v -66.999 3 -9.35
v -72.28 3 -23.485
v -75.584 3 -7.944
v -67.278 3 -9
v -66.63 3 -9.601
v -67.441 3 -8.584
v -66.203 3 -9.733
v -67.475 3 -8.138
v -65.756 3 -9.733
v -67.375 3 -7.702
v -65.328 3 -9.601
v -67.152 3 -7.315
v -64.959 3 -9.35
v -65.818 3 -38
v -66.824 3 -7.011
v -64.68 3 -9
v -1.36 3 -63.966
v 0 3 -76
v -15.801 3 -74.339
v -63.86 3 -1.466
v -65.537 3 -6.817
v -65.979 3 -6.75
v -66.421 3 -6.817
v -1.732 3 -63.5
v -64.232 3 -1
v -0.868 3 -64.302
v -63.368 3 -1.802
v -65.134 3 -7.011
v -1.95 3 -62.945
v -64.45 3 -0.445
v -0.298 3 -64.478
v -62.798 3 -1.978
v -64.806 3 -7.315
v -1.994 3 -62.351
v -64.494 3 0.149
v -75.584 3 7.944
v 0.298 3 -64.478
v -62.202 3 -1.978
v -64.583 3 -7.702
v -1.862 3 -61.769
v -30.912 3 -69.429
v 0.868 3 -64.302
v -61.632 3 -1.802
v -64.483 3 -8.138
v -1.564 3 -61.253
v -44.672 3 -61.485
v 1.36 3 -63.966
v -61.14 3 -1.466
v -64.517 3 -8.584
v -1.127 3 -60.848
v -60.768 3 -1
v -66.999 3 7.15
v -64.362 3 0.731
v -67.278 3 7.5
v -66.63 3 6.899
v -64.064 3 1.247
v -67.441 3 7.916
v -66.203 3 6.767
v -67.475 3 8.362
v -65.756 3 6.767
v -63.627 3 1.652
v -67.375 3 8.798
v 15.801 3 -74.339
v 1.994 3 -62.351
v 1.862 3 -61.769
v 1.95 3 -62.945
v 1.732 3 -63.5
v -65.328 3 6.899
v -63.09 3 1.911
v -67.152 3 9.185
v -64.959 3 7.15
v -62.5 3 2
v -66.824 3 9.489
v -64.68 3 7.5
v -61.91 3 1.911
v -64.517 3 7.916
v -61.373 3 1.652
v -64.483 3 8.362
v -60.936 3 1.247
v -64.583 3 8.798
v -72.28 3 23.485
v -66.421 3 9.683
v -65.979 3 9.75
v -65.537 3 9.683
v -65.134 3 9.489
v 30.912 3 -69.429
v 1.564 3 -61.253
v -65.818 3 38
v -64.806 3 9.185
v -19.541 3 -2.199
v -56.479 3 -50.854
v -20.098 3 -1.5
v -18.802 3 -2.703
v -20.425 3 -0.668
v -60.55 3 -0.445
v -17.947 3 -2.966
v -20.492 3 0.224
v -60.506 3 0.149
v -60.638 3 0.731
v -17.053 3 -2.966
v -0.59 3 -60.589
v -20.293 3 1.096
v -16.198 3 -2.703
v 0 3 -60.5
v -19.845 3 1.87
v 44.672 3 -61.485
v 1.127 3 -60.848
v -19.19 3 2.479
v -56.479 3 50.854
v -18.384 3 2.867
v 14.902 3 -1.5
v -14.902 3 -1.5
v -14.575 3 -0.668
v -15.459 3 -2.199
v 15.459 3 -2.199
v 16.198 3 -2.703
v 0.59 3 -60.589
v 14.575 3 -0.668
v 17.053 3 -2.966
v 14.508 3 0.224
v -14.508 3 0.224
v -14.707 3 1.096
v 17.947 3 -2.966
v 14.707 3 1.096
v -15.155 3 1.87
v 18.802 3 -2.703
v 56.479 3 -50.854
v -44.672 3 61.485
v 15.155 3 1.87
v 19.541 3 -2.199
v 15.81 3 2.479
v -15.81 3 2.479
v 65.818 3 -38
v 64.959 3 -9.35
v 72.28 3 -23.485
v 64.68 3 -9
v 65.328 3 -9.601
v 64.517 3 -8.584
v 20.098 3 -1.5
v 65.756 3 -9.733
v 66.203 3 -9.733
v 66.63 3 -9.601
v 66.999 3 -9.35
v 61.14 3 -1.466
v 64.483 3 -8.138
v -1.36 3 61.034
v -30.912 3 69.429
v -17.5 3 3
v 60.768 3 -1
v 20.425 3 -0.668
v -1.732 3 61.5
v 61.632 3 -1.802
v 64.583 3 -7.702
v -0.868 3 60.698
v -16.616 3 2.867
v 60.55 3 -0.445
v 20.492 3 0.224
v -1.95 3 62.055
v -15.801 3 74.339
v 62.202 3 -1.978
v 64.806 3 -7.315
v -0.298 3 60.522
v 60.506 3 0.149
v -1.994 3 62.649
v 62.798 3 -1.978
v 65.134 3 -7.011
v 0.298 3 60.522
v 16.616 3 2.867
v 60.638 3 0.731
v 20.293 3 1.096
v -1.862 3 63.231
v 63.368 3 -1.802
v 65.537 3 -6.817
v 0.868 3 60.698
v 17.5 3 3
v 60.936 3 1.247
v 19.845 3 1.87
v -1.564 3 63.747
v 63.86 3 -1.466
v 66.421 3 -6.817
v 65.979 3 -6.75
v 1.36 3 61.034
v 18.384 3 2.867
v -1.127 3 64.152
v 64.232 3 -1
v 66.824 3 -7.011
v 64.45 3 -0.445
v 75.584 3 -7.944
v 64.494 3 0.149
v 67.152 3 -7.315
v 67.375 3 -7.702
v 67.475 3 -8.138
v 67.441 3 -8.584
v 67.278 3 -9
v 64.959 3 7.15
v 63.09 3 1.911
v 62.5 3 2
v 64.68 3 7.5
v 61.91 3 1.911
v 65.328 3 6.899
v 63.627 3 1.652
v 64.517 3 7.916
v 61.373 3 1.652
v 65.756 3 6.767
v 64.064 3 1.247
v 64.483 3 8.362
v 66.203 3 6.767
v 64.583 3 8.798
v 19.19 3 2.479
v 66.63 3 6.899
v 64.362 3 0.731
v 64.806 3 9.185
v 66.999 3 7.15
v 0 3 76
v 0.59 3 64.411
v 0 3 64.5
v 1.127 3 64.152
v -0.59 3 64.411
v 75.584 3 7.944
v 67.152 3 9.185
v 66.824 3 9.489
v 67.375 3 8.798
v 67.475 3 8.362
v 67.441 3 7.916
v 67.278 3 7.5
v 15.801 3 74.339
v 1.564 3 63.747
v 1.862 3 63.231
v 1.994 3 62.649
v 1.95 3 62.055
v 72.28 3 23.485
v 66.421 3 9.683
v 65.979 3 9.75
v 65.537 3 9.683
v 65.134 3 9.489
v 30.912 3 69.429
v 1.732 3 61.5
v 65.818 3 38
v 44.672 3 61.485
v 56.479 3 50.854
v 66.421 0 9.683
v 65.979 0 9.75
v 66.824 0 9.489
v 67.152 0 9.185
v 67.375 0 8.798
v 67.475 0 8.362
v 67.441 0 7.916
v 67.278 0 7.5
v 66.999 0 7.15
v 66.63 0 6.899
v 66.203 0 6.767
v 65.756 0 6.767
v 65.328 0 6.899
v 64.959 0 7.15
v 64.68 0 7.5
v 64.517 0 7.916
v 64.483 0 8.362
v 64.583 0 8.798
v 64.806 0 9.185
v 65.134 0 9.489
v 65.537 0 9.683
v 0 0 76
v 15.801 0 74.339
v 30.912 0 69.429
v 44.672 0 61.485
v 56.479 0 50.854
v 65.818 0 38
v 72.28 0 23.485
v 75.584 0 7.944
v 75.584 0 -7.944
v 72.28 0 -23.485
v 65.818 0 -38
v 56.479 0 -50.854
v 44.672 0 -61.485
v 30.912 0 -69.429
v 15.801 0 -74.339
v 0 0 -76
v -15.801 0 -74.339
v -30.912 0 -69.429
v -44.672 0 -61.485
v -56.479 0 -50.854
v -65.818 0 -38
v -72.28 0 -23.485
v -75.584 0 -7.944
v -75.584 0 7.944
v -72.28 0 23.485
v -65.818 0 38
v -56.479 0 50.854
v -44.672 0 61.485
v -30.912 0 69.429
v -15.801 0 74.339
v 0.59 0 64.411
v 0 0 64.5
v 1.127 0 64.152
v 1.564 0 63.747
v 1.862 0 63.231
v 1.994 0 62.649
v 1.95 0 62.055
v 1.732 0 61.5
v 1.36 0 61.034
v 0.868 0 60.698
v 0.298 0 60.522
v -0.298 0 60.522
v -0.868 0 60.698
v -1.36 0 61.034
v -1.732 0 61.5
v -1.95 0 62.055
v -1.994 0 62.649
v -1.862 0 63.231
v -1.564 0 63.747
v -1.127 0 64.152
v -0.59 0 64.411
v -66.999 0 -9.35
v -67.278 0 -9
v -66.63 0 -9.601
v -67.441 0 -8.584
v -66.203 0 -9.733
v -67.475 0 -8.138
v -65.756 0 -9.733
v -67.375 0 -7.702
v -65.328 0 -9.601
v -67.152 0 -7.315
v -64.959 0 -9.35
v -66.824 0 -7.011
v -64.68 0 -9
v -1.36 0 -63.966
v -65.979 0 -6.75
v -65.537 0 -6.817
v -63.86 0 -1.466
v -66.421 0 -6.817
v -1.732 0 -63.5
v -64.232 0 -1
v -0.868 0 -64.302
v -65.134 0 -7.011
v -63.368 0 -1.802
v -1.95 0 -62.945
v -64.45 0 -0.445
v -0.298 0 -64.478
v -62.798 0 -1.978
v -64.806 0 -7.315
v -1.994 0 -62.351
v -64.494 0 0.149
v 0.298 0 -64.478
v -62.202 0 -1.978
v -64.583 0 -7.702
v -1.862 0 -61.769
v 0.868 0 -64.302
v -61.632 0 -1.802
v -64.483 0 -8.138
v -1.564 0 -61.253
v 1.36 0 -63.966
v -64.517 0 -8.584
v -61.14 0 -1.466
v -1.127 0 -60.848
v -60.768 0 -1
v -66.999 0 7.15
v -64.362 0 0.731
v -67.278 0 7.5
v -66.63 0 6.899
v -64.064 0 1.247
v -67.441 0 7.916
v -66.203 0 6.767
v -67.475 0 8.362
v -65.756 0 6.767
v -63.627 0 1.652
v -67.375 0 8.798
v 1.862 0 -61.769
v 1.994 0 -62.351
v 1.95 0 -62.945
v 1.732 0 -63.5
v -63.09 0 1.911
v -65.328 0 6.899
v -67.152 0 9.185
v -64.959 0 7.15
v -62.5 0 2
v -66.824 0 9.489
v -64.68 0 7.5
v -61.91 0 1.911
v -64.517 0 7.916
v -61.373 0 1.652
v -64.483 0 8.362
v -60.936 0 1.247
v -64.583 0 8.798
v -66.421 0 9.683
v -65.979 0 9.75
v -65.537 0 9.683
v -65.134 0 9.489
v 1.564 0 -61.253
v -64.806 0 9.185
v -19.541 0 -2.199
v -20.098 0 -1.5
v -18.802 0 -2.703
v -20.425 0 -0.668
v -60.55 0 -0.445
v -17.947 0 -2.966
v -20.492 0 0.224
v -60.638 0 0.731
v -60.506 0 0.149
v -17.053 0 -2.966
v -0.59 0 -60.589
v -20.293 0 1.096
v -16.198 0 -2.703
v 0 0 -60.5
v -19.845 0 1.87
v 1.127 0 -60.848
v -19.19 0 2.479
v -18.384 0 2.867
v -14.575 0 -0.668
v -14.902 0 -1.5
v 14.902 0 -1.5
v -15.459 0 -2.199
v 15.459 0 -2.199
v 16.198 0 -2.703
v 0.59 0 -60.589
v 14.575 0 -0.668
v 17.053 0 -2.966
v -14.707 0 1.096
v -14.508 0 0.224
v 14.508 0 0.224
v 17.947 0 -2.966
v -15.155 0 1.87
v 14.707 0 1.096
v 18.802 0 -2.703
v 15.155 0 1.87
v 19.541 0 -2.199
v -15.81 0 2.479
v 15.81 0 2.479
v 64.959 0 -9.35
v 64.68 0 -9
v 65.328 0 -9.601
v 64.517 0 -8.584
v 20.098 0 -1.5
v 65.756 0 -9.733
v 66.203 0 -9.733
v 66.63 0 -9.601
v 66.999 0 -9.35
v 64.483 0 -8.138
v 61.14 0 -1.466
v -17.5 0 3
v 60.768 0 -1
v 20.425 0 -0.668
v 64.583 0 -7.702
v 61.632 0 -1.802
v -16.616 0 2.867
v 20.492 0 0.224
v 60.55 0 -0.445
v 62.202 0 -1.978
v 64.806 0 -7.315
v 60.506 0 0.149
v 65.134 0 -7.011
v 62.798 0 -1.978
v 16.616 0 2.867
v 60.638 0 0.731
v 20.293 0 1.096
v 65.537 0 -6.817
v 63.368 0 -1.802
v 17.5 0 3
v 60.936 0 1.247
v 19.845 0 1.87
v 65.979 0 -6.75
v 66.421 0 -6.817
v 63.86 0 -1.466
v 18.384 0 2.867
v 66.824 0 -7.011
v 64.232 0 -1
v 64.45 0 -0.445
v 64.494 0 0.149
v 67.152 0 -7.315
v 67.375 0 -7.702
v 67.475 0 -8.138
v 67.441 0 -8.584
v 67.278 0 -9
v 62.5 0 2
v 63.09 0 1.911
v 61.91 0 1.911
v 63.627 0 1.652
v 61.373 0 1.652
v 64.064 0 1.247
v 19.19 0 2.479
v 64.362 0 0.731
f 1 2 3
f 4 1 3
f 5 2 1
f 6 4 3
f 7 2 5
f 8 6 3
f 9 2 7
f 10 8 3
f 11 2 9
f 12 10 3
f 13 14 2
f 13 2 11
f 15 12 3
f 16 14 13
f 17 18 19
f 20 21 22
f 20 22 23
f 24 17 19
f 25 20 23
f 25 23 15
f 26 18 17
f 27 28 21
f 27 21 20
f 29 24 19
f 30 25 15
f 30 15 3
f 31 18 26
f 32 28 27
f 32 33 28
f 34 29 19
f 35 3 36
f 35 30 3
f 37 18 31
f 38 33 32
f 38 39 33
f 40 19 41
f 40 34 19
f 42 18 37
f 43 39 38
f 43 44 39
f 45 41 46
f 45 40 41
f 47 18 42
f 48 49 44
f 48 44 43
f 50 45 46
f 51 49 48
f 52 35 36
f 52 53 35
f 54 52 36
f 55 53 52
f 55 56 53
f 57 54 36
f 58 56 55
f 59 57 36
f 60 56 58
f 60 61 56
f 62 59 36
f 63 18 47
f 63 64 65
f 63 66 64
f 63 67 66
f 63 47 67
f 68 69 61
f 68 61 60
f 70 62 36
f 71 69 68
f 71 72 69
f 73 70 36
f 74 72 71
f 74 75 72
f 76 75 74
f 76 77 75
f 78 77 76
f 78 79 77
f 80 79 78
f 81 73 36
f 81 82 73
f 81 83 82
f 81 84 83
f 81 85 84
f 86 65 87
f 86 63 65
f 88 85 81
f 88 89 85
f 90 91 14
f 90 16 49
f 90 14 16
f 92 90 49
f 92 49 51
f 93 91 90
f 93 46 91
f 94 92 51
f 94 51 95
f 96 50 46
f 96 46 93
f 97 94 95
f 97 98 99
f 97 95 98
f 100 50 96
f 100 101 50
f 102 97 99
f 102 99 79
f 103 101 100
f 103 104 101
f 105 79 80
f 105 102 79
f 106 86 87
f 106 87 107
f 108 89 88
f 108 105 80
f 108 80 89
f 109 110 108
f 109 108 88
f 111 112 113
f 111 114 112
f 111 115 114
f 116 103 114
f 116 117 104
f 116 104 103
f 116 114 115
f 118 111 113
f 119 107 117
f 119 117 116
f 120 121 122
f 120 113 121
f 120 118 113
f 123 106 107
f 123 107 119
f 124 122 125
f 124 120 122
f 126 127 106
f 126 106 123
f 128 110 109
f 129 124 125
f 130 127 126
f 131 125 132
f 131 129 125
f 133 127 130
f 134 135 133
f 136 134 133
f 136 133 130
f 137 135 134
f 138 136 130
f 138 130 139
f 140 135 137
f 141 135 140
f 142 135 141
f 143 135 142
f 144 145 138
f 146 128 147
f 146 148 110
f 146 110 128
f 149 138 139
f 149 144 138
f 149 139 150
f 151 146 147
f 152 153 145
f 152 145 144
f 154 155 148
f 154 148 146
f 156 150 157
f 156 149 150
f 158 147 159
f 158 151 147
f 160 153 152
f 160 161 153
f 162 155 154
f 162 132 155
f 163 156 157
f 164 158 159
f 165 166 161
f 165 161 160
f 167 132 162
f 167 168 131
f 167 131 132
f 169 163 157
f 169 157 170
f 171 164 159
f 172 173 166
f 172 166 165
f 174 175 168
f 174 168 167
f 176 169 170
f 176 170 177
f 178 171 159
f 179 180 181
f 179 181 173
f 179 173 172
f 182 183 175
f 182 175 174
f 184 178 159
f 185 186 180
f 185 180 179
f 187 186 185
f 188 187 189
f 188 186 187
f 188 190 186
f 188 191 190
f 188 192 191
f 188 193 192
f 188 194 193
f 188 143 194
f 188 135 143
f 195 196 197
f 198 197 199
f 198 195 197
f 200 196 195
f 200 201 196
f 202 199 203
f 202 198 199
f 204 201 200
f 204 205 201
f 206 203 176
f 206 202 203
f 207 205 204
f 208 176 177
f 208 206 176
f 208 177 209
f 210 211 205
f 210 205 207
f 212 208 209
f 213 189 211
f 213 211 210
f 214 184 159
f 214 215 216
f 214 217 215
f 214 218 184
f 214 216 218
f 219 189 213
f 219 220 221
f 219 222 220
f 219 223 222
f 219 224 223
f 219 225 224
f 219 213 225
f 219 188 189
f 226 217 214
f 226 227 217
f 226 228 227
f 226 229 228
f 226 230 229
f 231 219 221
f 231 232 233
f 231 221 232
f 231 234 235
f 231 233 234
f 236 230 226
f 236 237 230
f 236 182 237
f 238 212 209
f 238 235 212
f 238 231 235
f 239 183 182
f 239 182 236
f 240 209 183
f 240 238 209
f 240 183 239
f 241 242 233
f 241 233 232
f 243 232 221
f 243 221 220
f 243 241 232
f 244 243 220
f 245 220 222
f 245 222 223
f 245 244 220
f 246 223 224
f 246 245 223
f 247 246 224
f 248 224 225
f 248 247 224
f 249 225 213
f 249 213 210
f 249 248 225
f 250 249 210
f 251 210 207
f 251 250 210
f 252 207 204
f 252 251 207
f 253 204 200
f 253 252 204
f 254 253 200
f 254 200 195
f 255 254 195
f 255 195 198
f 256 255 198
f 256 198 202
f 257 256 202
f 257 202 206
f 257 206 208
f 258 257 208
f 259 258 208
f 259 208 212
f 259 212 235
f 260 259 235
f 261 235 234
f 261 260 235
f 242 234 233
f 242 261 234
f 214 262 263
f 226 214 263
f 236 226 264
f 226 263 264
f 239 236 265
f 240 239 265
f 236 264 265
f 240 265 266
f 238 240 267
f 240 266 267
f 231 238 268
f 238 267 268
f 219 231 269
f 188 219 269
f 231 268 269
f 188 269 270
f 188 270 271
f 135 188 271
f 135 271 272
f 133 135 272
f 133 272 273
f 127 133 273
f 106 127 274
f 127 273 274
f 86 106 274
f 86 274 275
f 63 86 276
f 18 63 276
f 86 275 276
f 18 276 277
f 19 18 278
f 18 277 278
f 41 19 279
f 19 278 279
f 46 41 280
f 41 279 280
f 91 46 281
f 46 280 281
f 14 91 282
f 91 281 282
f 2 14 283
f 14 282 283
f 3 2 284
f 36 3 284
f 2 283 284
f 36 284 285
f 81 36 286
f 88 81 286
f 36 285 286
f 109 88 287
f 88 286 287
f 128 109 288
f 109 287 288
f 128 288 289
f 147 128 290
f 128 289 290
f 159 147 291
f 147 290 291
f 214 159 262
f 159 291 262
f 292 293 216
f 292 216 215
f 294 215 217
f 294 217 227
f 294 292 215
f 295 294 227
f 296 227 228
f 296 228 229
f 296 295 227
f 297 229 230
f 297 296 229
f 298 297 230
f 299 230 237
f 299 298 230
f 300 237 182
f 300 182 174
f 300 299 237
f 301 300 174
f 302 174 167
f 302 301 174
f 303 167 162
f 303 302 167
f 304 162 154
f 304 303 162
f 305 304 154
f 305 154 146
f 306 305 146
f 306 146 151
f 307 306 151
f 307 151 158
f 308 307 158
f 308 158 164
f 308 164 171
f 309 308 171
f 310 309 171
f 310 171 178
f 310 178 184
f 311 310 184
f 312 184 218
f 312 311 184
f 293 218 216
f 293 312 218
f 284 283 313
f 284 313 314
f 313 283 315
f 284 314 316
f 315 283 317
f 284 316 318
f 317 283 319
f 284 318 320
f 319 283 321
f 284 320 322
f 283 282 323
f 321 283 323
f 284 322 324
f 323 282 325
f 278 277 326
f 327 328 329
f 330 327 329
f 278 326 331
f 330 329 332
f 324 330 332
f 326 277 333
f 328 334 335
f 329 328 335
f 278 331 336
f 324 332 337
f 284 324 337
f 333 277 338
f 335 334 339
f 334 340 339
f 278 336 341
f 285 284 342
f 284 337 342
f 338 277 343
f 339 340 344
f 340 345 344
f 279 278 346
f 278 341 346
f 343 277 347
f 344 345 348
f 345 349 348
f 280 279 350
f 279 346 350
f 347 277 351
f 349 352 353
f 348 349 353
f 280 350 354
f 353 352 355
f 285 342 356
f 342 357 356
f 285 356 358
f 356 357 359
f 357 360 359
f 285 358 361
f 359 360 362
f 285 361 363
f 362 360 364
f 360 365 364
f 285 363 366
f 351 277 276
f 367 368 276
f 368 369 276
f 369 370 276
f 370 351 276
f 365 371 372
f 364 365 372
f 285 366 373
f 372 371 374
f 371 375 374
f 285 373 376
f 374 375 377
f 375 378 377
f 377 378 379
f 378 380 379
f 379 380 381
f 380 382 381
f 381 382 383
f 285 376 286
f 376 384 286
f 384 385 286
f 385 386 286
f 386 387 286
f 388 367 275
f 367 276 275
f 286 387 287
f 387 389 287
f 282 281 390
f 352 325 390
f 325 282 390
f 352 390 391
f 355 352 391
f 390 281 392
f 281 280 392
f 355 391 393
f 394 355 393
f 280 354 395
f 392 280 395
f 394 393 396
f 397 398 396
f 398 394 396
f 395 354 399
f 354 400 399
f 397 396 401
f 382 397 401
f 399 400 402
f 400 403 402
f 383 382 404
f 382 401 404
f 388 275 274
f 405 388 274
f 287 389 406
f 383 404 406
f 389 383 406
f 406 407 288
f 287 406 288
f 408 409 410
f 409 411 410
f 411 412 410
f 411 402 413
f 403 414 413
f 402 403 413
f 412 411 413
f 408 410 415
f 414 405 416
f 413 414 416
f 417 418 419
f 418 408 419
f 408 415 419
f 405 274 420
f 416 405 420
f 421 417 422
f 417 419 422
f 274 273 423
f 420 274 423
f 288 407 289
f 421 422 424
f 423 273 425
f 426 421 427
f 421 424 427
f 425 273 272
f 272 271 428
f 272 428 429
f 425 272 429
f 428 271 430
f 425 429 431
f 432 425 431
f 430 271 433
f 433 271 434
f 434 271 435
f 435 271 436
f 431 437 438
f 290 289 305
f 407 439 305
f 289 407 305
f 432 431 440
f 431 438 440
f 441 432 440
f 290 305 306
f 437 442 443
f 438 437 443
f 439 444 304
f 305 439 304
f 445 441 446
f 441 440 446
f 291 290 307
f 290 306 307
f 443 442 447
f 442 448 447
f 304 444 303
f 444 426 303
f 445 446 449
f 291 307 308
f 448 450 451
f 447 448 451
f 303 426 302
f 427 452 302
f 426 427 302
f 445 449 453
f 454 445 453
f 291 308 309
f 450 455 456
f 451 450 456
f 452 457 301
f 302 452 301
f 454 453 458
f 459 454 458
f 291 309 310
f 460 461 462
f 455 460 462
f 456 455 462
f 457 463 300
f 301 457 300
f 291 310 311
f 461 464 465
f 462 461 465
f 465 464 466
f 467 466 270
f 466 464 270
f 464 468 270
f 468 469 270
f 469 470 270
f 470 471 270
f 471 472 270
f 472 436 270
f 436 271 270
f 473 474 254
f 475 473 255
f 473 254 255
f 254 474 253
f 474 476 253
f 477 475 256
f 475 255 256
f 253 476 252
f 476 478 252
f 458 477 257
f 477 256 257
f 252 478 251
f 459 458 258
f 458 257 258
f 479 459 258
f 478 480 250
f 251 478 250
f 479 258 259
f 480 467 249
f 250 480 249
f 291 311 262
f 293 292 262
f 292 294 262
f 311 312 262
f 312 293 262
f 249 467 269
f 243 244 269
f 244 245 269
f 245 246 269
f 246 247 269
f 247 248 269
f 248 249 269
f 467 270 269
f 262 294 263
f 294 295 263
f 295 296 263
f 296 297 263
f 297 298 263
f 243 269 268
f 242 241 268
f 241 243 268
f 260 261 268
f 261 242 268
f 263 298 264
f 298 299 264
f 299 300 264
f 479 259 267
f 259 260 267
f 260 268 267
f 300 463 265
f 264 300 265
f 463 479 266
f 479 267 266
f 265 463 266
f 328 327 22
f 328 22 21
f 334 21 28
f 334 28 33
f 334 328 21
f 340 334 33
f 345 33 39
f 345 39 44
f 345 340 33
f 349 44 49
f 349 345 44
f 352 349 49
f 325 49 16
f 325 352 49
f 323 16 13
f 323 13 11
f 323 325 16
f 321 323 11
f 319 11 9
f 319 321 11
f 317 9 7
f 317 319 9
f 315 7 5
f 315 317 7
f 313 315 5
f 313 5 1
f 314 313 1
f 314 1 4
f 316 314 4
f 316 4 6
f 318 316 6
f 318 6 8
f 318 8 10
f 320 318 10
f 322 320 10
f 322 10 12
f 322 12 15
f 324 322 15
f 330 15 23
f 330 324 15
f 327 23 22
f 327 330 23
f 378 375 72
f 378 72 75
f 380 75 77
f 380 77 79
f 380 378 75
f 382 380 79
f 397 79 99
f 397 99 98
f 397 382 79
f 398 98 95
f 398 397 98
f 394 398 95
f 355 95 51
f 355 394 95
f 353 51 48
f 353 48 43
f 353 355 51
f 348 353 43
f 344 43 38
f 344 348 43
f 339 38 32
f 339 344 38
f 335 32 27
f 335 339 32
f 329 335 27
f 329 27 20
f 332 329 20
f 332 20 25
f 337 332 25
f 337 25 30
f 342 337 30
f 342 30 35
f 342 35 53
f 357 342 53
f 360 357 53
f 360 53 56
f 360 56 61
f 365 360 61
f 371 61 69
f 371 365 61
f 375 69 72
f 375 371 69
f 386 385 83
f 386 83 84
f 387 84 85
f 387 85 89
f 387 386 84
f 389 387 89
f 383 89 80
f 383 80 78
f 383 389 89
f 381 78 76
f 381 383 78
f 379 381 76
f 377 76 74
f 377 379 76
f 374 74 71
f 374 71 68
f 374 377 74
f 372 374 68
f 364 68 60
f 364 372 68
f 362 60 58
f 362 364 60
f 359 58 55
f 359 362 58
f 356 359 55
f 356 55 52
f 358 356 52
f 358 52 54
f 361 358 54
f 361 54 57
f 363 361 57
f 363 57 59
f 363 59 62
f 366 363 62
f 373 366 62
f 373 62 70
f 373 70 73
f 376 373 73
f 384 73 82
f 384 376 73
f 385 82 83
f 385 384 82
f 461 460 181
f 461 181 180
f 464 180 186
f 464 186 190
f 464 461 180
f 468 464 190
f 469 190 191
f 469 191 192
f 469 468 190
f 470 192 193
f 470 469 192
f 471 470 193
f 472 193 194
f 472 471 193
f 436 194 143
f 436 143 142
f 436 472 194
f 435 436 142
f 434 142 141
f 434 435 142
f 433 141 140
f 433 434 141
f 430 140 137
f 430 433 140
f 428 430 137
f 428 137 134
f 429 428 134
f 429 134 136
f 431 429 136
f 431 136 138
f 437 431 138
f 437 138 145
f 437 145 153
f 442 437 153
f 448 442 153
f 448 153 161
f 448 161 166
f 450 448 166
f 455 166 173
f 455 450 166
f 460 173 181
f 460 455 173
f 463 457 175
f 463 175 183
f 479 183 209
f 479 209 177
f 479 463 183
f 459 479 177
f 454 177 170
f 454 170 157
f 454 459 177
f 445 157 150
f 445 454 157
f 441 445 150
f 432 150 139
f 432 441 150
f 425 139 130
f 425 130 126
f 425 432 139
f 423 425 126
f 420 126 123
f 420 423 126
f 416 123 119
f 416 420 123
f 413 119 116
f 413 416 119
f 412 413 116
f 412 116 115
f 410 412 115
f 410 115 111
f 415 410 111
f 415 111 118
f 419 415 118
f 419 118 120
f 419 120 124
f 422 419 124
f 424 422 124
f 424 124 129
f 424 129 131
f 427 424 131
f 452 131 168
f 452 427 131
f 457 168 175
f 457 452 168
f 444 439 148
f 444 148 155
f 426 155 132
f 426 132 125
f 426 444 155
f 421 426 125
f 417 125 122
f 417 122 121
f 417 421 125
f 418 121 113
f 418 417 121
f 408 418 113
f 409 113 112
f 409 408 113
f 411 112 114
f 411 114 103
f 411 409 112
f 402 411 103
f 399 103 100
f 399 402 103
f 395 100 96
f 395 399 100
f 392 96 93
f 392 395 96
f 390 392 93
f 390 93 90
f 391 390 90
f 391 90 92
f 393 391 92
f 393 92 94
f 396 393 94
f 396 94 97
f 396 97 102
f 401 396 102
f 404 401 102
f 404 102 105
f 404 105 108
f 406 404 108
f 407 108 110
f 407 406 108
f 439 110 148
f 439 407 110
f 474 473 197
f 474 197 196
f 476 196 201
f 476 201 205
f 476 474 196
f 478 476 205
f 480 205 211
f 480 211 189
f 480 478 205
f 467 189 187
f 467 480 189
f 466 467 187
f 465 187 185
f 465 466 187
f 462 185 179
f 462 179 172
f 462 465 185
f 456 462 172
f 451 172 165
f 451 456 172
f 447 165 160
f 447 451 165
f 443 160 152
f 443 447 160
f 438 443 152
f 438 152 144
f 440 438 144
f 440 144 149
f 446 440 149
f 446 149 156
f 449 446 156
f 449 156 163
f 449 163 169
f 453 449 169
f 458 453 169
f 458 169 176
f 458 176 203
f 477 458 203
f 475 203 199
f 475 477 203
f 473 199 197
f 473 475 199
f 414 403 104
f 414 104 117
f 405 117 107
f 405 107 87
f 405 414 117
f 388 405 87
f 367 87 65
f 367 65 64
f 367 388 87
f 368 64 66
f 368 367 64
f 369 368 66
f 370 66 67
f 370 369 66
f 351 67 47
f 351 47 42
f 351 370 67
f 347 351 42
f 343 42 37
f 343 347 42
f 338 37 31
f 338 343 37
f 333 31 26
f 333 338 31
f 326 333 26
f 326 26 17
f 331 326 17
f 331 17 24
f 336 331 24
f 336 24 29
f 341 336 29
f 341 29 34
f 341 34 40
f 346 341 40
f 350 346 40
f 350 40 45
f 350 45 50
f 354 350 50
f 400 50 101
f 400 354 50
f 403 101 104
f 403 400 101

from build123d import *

# Parameters (mm, degrees)
SKETCH1_R           = 76
SKETCH1_R_2         = 1.5
SKETCH1_R_3         = 2
SKETCH1_R_4         = 3
BOSS_EXTRUDE1_DEPTH = 3


with BuildPart() as part:
    # Sketch1 → Boss-Extrude1 (new body)
    with BuildSketch(Plane(origin=(0, 0, 0), x_dir=(1, 0, 0), z_dir=(0, 1, 0))):
        with Locations(Location((0, 0, 0), (0, 0, 270))):
            Circle(SKETCH1_R)
        with Locations(Location((-65.979085433, -8.25, 0), (0, 0, 270))):
            Circle(SKETCH1_R_2, mode=Mode.SUBTRACT)
        with Locations(Location((-62.5, 0, 0), (0, 0, 270))):
            Circle(SKETCH1_R_3, mode=Mode.SUBTRACT)
        with Locations(Location((-65.979085433, 8.25, 0), (0, 0, 270))):
            Circle(SKETCH1_R_2, mode=Mode.SUBTRACT)
        with Locations(Location((65.979085433, 8.25, 0), (0, 0, 270))):
            Circle(SKETCH1_R_2, mode=Mode.SUBTRACT)
        with Locations(Location((65.979085433, -8.25, 0), (0, 0, 270))):
            Circle(SKETCH1_R_2, mode=Mode.SUBTRACT)
        with Locations(Location((0, 62.5, 0), (0, 0, 270))):
            Circle(SKETCH1_R_3, mode=Mode.SUBTRACT)
        with Locations(Location((62.5, 0, 0), (0, 0, 270))):
            Circle(SKETCH1_R_3, mode=Mode.SUBTRACT)
        with Locations(Location((0, -62.5, 0), (0, 0, 270))):
            Circle(SKETCH1_R_3, mode=Mode.SUBTRACT)
        with Locations(Location((17.5, 0, 0), (0, 0, 270))):
            Circle(SKETCH1_R_4, mode=Mode.SUBTRACT)
        with Locations(Location((-17.5, 0, 0), (0, 0, 270))):
            Circle(SKETCH1_R_4, mode=Mode.SUBTRACT)
    extrude(amount=BOSS_EXTRUDE1_DEPTH)


solid = part.part
